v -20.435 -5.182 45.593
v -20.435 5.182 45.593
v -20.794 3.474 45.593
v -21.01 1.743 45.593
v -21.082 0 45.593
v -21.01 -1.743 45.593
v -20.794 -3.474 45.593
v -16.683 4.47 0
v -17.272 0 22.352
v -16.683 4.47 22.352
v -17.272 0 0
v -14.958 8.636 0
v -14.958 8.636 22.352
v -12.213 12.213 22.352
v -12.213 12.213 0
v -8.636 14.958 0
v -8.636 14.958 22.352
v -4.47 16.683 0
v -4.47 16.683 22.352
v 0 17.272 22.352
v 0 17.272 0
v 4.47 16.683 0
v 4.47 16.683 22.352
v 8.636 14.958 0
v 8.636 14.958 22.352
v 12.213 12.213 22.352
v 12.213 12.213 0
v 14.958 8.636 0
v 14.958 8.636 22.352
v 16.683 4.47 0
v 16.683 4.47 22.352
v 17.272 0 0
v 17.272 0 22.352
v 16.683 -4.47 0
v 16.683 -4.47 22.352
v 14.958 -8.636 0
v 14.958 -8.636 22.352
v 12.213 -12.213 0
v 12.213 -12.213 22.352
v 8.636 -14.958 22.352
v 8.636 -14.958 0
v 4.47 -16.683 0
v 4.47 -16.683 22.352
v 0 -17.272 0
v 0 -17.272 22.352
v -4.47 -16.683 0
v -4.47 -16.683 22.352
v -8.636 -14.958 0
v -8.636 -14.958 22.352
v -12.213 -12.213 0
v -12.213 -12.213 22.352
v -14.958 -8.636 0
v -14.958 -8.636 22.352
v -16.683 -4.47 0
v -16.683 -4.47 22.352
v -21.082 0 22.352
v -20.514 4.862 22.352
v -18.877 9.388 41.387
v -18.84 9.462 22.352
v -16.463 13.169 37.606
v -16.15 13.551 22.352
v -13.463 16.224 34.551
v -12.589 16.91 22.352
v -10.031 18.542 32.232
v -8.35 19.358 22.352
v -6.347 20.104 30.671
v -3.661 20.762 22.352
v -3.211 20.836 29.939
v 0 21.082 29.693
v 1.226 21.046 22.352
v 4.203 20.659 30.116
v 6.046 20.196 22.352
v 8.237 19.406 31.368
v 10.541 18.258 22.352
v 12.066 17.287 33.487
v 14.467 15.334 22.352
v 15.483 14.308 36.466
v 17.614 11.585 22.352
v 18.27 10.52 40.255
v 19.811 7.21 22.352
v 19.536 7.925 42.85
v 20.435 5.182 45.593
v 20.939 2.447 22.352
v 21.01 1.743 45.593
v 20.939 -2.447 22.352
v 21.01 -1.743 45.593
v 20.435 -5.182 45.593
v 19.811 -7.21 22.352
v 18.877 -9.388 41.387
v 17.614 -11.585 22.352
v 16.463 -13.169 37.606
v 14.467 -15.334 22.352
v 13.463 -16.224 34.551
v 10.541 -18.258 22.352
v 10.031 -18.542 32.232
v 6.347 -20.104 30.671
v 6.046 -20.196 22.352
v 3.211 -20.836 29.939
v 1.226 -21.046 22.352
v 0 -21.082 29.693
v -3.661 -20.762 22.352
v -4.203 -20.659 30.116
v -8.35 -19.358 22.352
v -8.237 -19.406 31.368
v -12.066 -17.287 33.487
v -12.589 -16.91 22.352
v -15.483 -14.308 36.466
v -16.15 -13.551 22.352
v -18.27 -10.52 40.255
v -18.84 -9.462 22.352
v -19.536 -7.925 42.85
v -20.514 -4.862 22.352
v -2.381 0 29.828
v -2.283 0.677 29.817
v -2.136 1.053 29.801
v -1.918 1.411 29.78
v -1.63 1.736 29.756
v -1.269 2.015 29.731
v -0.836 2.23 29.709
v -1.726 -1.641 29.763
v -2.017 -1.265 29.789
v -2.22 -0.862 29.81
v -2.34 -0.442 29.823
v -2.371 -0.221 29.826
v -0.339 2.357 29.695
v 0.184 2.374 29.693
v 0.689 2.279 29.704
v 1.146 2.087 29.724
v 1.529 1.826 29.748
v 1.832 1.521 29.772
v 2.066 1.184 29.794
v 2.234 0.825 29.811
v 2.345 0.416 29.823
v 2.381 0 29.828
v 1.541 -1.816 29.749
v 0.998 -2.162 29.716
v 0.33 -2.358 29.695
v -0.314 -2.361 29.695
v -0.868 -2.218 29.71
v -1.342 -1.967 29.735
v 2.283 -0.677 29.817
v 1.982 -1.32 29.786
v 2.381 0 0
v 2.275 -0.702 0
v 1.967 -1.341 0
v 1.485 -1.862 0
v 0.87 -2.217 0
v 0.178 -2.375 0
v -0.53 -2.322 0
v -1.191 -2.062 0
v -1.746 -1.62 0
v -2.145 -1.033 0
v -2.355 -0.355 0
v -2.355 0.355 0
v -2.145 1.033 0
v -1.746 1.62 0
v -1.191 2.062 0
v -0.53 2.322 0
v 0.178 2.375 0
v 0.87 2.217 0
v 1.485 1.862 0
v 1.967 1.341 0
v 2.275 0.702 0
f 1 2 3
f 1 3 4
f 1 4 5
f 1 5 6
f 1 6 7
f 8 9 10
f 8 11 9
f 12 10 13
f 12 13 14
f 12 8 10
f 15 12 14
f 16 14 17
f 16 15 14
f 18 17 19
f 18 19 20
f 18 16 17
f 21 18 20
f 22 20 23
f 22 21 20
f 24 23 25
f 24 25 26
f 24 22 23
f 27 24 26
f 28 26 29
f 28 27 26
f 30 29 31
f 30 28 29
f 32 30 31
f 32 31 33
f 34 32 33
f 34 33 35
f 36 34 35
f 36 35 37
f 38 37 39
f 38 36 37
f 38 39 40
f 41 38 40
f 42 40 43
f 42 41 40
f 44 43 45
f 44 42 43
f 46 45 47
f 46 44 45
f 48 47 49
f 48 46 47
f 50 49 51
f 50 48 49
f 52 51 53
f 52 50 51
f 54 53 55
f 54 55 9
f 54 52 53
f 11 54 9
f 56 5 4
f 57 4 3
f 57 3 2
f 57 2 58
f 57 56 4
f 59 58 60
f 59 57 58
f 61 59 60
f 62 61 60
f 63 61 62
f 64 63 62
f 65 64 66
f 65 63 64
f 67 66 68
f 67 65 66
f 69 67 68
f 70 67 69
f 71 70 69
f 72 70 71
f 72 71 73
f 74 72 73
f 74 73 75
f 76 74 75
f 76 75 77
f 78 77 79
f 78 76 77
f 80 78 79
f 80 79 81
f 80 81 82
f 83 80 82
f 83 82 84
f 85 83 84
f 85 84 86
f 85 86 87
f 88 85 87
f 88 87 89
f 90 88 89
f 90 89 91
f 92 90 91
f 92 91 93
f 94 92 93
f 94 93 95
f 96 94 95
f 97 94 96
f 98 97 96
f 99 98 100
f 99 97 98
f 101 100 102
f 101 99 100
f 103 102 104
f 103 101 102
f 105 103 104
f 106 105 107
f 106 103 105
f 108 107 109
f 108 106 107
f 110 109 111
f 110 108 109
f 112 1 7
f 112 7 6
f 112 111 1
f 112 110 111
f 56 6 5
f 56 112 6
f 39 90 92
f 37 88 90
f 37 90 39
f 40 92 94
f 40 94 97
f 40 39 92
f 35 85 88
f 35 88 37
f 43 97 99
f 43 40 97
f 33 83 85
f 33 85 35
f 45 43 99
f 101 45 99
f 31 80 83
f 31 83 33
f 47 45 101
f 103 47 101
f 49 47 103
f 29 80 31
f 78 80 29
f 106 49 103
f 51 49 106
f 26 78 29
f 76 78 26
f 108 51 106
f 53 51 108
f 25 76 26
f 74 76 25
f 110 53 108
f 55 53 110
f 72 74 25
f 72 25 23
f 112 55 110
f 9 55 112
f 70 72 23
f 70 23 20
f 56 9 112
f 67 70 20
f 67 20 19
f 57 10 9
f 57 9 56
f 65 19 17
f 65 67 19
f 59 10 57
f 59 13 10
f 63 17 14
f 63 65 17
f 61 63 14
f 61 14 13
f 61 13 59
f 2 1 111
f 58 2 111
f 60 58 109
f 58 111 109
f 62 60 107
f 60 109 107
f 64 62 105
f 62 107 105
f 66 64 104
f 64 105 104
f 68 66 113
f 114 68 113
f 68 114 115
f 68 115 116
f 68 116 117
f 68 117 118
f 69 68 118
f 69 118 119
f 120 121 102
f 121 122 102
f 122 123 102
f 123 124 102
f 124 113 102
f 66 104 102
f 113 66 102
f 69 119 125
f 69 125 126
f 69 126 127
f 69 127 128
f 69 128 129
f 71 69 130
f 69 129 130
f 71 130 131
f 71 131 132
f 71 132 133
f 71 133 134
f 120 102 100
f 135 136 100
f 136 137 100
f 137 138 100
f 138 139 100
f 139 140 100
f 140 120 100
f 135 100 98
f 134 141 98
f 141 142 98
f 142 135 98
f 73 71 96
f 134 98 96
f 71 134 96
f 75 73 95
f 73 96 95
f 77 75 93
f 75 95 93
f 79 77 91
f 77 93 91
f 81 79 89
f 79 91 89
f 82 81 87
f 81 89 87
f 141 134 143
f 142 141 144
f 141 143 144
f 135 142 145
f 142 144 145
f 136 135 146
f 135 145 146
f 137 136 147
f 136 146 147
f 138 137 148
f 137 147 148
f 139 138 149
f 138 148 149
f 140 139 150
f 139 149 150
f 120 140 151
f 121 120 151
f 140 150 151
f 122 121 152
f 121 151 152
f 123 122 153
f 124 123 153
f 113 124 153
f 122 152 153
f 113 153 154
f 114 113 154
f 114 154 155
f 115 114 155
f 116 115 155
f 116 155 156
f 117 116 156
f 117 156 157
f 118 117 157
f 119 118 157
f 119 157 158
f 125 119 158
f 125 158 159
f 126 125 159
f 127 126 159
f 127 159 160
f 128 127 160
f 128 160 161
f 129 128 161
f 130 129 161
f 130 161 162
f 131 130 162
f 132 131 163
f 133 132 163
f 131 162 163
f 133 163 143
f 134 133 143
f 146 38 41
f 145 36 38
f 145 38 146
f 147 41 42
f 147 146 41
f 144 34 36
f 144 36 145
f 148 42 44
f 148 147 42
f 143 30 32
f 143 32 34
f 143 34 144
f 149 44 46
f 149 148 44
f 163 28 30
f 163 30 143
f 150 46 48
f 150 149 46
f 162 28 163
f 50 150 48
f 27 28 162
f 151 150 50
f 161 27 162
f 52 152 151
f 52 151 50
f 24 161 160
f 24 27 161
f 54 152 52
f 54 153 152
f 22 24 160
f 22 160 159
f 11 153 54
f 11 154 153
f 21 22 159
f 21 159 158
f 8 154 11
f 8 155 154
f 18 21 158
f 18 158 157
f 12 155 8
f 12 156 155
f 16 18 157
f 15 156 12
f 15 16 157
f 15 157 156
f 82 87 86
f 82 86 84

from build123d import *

# Parameters (mm, degrees)
F2_R          = 2.38125
F3_DEPTH      = 45.594
F4_R          = 21.082
F5_DEPTH      = 21.083
F5_DEPTH_BACK = 21.083


with BuildPart() as f1:
    # F0 (on Front) → F1 (revolve)
    with BuildSketch(Plane.XZ):
        Polygon((-17.272, 0), (0, 0), (0, 45.593), (-21.082, 45.593), (-21.082, 22.352), (-17.272, 22.352), align=None)
    revolve(axis=Axis((0, 0, 22.7965), (0, 0, -1)))

    # F2 (on face) → F3 (cut, through all)
    with BuildSketch(Plane(origin=(0, 0, 0), x_dir=(1, 0, 0), z_dir=(0, 0, -1))):
        Circle(F2_R)
    extrude(amount=-F3_DEPTH, mode=Mode.SUBTRACT)

    # F4 (on Front) → F5 (cut, two sides)
    with BuildSketch(Plane.XZ) as f5_sk:
        with Locations((0, 50.7746)):
            Circle(F4_R)
    extrude(amount=-F5_DEPTH, mode=Mode.SUBTRACT)
    extrude(f5_sk.sketch, amount=F5_DEPTH_BACK, mode=Mode.SUBTRACT)


solid = f1.part
